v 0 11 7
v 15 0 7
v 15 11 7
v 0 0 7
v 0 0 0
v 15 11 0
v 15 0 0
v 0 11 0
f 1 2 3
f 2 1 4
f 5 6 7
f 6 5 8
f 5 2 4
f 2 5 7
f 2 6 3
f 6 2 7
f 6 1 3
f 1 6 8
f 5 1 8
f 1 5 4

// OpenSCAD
// Generated by SolidPython 1.0.1 on 2020-07-29 00:46:55


cube(size = [15, 11, 7]);
/***********************************************
*********      SolidPython code:      **********
************************************************
 
# import packages: SolidPython
from solid import *
from solid.utils import *
from itertools import chain, combinations, permutations


class Resize:

    def __init__(self, scad_file):
        self.scad_file = scad_file
        #self.scad_file = import_scad(scad_file)
        # cone/cylinder param:
        self.r1 = 0
        self.r2 = 0
        self.h = 0
        # rectangular prism param:
        self.w = 0
        self.l = 0
        # ellipse param:
        self.r = 0

    # import OpenScad code (file name corresponds to shape)


    # classify shape + parameters
    def assign(self, param1, param2, param3):
        if self.scad_file == 'cone.scad':
            self.r1 = param1
            self.r2 = param2
            self.h = param3
        elif self.scad_file == 'cylinder.scad':
            self.r1 = param1
            self.r2 = param2
            self.h = param3
        elif self.scad_file == 'rectangularPrism.scad':
            self.h = param1
            self.l = param2
            self.w = param3
        else:
            self.r = param1
            self.h = param2

    # resize parameters
    def iterate(self):
        x = range(3, 20, 2)
        i = 1
        if self.scad_file == 'cone.scad':
            tempList = list(permutations(x, 2))
            for temp in tempList:
                param1 = temp[0]
                param2 = temp[1]
                filepath = 'produced_scad_files/' + 'cone' + str(param1) + '_' + str(param2) + '_' + '.scad'
                scad_render_to_file(cylinder(h=param1, r1=param2, r2=0), filepath)

        elif self.scad_file == 'cylinder.scad':
            tempList = list(permutations(x, 3))
            for temp in tempList:
                param1 = temp[0]
                param2 = temp[1]
                filepath = 'produced_scad_files/' + 'cylinder' + str(param1) + '_' + str(param2) + '_' + '.scad'
                scad_render_to_file(cylinder(h=param1, r1=param2, r2=param2), filepath)

        elif self.scad_file == 'rectangularPrism.scad':
            tempList = list(permutations(x, 3))
            for temp in tempList:
                param1 = temp[0]
                param2 = temp[1]
                param3 = temp[2]
                filepath = 'produced_scad_files/' + 'rectangularPrism' + str(param1) + '_' + str(param2) + '_' + str(
                    param3) + '.scad'
                scad_render_to_file(cube(size=(param1, param2, param3)), filepath)

        elif self.scad_file == 'ellipse.scad':
            tempList = list(permutations(x, 4))
            for temp in tempList:
                param1 = temp[0]
                param2 = temp[1]
                param3 = temp[2]
                param4 = temp[3]
                filepath = 'produced_scad_files/' + 'ellipse' + str(param1) + '_' + str(param2) + '_' + str(param3) + '_' + str(param4) + '.scad'
                scad_render_to_file(scale([param1, param2, param3])(sphere(r=param4)), filepath)

    def render_to_scadfile(self):
        scad_render_to_file(scad, 'example.scad') 
 
************************************************/
